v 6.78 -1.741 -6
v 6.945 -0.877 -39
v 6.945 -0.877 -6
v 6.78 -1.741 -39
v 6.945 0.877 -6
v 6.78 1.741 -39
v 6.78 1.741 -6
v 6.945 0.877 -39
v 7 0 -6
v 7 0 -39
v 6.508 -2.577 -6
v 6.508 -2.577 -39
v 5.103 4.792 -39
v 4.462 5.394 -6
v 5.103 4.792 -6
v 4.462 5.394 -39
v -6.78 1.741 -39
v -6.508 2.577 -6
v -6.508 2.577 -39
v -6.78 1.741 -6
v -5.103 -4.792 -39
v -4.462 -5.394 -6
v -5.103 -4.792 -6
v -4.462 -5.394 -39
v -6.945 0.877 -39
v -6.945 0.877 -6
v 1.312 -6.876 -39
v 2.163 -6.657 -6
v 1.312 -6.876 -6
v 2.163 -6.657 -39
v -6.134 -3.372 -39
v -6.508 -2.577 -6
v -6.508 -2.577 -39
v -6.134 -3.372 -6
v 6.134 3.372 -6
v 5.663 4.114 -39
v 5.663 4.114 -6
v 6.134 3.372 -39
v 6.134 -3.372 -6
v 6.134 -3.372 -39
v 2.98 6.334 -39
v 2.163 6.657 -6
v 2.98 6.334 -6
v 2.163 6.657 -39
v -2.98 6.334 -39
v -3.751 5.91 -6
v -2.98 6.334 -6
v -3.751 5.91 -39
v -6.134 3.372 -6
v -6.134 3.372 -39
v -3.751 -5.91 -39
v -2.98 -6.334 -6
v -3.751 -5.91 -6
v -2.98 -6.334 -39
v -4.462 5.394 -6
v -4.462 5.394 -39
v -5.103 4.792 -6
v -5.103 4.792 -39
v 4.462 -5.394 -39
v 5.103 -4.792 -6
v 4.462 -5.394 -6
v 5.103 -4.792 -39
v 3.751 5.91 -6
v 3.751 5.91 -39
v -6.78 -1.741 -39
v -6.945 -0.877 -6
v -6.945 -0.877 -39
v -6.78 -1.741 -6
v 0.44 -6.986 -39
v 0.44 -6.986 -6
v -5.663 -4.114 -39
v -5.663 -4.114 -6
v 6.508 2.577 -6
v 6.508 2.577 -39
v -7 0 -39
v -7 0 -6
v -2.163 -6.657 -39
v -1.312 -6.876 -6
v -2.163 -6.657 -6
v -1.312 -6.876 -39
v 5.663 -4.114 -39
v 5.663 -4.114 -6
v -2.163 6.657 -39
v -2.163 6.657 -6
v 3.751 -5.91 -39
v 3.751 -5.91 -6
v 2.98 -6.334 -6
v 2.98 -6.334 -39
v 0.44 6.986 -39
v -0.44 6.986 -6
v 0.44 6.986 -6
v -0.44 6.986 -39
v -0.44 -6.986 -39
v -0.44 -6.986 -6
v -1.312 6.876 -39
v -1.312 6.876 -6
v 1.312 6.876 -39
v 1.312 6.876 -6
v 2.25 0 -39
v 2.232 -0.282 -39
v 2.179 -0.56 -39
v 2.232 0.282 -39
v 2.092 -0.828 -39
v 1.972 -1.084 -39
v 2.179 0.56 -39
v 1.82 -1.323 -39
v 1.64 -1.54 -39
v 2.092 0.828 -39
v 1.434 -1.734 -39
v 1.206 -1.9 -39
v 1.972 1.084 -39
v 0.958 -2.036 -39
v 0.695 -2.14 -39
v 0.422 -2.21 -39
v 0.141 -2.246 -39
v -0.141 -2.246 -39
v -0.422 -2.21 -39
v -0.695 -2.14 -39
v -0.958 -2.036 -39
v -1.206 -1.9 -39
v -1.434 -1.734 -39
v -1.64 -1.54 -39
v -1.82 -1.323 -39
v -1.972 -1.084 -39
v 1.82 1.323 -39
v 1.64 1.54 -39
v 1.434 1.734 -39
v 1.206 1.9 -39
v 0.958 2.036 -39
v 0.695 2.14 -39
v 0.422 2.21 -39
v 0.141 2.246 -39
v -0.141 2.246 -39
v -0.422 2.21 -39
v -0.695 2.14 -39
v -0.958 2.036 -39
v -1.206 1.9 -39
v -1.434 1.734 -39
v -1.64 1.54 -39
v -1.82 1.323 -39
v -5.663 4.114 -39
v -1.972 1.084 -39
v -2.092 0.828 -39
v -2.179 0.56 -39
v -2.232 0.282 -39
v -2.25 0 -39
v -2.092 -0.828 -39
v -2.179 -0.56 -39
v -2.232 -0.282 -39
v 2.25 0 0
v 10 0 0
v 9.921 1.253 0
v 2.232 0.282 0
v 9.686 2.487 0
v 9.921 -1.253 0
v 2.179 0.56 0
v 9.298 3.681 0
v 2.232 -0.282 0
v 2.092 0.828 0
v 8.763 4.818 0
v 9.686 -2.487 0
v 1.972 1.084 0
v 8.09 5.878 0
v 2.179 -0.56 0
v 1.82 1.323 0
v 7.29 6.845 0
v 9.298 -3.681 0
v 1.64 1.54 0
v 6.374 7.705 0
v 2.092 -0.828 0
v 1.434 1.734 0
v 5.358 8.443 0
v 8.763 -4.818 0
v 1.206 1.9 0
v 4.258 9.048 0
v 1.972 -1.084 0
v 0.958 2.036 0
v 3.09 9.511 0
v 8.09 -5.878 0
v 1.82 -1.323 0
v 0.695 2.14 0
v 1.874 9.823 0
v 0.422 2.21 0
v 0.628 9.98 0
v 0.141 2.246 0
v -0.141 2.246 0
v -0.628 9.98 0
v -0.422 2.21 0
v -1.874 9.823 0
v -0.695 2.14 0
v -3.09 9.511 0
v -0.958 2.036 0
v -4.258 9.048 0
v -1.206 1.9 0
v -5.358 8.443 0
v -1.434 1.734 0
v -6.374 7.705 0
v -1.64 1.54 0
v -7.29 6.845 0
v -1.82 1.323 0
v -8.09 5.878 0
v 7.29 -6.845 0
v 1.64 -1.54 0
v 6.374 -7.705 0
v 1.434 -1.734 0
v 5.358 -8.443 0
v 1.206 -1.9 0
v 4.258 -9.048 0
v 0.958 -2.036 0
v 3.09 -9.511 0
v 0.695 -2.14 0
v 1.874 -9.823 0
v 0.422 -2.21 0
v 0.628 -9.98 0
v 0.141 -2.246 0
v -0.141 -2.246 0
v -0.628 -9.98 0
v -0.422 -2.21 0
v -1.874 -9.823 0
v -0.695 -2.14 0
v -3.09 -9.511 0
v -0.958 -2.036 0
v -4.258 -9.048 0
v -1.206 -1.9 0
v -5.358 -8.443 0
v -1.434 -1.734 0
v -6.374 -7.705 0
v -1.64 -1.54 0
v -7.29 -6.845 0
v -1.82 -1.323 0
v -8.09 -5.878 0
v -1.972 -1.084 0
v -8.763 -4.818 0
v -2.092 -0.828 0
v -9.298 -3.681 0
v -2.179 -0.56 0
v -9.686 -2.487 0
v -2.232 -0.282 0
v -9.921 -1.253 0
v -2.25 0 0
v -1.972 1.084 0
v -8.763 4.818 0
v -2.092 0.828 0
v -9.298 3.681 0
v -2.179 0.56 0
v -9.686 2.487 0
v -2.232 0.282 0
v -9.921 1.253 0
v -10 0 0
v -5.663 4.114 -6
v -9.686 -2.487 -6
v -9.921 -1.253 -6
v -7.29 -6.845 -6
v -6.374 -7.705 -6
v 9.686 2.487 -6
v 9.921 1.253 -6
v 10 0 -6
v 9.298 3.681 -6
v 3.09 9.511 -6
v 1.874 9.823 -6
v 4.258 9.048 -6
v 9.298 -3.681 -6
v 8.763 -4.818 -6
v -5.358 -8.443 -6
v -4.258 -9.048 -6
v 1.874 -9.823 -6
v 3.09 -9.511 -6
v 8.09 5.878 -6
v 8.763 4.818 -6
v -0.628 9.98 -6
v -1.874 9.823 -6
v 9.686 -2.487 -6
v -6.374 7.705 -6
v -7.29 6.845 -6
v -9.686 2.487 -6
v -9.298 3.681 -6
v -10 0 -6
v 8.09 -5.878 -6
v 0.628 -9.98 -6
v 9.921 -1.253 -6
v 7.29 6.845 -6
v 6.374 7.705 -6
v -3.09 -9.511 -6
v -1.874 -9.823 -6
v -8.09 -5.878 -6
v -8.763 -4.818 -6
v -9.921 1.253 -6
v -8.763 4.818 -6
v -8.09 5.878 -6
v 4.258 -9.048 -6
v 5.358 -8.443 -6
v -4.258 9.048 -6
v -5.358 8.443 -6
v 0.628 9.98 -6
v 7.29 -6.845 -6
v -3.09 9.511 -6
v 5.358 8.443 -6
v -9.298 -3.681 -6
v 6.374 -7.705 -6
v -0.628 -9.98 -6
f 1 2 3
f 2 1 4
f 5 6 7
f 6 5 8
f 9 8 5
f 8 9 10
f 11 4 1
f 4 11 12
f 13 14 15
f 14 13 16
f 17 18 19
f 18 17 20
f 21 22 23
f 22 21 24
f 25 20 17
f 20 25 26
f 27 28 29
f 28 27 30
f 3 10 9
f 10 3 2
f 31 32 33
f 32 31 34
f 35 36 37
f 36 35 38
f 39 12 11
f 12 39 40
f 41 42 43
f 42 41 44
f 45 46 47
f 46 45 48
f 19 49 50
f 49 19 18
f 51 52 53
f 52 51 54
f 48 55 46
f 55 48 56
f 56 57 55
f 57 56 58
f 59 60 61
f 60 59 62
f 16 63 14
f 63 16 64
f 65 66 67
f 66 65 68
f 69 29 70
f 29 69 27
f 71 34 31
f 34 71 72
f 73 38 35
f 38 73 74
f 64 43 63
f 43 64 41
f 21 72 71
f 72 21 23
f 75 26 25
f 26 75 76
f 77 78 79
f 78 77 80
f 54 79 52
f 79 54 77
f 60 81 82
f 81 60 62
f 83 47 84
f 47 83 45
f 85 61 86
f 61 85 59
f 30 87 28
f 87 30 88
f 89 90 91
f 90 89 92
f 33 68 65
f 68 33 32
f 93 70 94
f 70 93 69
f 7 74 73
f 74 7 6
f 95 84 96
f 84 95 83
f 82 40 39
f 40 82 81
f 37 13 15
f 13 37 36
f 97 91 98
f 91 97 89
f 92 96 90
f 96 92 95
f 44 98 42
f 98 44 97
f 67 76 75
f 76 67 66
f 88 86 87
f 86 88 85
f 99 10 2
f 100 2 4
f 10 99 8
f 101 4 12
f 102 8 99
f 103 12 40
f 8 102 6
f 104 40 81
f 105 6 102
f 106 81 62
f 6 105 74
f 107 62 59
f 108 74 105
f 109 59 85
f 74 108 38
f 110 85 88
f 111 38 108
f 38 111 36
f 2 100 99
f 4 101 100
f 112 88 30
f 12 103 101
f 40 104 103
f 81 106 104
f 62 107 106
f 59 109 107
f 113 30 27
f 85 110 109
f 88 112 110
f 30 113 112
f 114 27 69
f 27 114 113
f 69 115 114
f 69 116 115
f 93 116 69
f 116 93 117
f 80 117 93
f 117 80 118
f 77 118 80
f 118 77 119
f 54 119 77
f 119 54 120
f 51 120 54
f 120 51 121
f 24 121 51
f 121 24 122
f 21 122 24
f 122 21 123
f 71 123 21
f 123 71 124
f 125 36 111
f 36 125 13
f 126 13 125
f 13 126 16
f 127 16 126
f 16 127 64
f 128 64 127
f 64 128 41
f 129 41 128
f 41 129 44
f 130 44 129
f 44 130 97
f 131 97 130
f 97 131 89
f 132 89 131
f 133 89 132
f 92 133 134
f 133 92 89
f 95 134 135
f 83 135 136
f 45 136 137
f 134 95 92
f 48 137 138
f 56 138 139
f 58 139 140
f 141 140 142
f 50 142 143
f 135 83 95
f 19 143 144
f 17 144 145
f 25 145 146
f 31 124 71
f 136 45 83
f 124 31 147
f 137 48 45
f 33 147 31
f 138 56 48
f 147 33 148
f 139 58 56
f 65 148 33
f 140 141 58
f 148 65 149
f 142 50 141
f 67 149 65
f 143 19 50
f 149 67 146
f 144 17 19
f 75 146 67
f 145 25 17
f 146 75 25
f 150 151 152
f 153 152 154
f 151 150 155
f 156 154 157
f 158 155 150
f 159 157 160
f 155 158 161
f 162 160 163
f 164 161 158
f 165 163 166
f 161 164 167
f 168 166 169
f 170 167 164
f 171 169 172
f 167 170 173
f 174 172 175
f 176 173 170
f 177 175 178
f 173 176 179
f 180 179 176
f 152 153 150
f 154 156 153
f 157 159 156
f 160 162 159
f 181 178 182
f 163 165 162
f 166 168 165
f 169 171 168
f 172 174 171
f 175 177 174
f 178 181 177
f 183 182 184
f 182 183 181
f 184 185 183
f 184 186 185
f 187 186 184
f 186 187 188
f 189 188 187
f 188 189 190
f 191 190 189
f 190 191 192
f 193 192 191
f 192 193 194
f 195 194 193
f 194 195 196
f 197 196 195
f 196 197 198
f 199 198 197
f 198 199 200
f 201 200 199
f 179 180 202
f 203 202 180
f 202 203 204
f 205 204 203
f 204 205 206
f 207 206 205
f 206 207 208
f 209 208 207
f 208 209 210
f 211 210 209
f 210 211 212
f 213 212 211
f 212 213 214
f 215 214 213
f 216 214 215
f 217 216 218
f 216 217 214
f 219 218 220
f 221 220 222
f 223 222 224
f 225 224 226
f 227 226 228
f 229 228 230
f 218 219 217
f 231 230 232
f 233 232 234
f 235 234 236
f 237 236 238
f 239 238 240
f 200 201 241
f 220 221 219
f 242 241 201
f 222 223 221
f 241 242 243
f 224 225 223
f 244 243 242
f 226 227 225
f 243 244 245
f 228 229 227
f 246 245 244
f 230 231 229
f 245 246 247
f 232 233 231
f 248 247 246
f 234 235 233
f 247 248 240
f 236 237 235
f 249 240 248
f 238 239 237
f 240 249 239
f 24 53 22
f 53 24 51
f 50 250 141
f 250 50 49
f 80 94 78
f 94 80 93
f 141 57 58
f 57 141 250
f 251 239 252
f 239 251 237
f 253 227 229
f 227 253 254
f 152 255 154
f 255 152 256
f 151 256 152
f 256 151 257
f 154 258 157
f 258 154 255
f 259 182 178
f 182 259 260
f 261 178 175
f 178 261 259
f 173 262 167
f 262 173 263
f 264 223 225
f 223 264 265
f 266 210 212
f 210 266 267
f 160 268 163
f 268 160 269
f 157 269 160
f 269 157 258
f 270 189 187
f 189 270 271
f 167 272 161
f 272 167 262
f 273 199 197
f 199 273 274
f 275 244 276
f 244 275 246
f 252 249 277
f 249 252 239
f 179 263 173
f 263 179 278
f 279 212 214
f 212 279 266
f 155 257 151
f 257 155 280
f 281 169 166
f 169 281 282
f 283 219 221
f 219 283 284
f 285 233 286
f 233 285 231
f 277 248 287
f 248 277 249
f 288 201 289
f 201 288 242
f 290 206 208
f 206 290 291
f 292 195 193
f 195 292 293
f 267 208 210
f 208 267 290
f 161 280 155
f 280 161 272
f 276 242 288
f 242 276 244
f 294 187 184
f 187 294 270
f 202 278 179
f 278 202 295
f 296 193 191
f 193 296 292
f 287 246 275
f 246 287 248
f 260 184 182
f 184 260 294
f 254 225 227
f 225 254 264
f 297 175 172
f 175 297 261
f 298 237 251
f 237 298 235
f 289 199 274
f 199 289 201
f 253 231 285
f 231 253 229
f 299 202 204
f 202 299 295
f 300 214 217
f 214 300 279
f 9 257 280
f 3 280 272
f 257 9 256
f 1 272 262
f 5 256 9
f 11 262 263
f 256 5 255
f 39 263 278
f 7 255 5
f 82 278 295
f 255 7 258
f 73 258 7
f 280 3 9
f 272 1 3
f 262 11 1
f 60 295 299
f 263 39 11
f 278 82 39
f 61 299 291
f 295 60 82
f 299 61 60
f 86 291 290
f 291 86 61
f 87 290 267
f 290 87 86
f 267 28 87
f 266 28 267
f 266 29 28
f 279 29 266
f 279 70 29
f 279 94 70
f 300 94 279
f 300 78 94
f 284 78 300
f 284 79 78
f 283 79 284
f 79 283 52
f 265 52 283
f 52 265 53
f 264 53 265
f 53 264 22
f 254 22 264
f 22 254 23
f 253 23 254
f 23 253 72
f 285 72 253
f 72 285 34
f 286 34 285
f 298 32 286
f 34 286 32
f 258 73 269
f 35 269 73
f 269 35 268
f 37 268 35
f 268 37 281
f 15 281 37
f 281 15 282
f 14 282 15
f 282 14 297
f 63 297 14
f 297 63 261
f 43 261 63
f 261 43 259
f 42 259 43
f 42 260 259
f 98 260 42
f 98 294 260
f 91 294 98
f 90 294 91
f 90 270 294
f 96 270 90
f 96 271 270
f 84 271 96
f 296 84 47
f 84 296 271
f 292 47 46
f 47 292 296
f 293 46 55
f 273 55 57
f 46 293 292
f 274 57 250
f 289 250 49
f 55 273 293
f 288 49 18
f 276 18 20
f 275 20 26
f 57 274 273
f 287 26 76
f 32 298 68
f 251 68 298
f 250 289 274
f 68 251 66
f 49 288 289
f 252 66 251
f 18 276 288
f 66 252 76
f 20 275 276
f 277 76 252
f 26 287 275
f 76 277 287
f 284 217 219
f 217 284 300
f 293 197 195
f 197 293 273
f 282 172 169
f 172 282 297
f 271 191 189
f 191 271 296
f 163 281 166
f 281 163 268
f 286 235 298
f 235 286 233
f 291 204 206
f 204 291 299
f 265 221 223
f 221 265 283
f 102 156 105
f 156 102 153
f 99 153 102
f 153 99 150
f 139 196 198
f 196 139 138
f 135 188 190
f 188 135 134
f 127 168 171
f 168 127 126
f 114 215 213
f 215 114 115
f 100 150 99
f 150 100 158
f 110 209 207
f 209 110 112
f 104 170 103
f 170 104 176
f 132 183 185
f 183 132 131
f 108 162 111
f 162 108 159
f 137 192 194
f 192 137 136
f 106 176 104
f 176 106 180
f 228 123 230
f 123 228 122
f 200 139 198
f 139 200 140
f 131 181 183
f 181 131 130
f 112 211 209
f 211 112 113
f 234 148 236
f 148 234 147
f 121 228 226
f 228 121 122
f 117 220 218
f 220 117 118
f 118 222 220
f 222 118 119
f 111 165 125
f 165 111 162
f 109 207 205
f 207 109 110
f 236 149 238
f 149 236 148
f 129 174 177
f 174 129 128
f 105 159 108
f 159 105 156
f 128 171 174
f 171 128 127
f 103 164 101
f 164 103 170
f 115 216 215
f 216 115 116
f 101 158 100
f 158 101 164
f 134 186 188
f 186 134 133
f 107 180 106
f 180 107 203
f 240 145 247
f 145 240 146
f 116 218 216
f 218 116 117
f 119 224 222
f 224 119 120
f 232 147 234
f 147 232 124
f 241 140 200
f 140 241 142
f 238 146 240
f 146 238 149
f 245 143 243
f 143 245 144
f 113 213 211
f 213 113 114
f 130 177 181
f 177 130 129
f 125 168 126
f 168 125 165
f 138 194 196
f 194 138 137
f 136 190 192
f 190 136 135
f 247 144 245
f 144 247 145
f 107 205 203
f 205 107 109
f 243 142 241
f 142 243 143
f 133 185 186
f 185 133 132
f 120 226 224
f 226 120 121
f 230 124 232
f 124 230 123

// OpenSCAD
$fn = 50;


difference() {
	union() {
		translate(v = [0, 0, -39.0000000000]) {
			cylinder(h = 39, r = 7.0000000000);
		}
		translate(v = [0, 0, -6.0000000000]) {
			cylinder(h = 6, r = 10.0000000000);
		}
	}
	union() {
		#translate(v = [0, 0, -39]) {
			cylinder(h = 39, r = 2.2500000000);
		}
	}
}
